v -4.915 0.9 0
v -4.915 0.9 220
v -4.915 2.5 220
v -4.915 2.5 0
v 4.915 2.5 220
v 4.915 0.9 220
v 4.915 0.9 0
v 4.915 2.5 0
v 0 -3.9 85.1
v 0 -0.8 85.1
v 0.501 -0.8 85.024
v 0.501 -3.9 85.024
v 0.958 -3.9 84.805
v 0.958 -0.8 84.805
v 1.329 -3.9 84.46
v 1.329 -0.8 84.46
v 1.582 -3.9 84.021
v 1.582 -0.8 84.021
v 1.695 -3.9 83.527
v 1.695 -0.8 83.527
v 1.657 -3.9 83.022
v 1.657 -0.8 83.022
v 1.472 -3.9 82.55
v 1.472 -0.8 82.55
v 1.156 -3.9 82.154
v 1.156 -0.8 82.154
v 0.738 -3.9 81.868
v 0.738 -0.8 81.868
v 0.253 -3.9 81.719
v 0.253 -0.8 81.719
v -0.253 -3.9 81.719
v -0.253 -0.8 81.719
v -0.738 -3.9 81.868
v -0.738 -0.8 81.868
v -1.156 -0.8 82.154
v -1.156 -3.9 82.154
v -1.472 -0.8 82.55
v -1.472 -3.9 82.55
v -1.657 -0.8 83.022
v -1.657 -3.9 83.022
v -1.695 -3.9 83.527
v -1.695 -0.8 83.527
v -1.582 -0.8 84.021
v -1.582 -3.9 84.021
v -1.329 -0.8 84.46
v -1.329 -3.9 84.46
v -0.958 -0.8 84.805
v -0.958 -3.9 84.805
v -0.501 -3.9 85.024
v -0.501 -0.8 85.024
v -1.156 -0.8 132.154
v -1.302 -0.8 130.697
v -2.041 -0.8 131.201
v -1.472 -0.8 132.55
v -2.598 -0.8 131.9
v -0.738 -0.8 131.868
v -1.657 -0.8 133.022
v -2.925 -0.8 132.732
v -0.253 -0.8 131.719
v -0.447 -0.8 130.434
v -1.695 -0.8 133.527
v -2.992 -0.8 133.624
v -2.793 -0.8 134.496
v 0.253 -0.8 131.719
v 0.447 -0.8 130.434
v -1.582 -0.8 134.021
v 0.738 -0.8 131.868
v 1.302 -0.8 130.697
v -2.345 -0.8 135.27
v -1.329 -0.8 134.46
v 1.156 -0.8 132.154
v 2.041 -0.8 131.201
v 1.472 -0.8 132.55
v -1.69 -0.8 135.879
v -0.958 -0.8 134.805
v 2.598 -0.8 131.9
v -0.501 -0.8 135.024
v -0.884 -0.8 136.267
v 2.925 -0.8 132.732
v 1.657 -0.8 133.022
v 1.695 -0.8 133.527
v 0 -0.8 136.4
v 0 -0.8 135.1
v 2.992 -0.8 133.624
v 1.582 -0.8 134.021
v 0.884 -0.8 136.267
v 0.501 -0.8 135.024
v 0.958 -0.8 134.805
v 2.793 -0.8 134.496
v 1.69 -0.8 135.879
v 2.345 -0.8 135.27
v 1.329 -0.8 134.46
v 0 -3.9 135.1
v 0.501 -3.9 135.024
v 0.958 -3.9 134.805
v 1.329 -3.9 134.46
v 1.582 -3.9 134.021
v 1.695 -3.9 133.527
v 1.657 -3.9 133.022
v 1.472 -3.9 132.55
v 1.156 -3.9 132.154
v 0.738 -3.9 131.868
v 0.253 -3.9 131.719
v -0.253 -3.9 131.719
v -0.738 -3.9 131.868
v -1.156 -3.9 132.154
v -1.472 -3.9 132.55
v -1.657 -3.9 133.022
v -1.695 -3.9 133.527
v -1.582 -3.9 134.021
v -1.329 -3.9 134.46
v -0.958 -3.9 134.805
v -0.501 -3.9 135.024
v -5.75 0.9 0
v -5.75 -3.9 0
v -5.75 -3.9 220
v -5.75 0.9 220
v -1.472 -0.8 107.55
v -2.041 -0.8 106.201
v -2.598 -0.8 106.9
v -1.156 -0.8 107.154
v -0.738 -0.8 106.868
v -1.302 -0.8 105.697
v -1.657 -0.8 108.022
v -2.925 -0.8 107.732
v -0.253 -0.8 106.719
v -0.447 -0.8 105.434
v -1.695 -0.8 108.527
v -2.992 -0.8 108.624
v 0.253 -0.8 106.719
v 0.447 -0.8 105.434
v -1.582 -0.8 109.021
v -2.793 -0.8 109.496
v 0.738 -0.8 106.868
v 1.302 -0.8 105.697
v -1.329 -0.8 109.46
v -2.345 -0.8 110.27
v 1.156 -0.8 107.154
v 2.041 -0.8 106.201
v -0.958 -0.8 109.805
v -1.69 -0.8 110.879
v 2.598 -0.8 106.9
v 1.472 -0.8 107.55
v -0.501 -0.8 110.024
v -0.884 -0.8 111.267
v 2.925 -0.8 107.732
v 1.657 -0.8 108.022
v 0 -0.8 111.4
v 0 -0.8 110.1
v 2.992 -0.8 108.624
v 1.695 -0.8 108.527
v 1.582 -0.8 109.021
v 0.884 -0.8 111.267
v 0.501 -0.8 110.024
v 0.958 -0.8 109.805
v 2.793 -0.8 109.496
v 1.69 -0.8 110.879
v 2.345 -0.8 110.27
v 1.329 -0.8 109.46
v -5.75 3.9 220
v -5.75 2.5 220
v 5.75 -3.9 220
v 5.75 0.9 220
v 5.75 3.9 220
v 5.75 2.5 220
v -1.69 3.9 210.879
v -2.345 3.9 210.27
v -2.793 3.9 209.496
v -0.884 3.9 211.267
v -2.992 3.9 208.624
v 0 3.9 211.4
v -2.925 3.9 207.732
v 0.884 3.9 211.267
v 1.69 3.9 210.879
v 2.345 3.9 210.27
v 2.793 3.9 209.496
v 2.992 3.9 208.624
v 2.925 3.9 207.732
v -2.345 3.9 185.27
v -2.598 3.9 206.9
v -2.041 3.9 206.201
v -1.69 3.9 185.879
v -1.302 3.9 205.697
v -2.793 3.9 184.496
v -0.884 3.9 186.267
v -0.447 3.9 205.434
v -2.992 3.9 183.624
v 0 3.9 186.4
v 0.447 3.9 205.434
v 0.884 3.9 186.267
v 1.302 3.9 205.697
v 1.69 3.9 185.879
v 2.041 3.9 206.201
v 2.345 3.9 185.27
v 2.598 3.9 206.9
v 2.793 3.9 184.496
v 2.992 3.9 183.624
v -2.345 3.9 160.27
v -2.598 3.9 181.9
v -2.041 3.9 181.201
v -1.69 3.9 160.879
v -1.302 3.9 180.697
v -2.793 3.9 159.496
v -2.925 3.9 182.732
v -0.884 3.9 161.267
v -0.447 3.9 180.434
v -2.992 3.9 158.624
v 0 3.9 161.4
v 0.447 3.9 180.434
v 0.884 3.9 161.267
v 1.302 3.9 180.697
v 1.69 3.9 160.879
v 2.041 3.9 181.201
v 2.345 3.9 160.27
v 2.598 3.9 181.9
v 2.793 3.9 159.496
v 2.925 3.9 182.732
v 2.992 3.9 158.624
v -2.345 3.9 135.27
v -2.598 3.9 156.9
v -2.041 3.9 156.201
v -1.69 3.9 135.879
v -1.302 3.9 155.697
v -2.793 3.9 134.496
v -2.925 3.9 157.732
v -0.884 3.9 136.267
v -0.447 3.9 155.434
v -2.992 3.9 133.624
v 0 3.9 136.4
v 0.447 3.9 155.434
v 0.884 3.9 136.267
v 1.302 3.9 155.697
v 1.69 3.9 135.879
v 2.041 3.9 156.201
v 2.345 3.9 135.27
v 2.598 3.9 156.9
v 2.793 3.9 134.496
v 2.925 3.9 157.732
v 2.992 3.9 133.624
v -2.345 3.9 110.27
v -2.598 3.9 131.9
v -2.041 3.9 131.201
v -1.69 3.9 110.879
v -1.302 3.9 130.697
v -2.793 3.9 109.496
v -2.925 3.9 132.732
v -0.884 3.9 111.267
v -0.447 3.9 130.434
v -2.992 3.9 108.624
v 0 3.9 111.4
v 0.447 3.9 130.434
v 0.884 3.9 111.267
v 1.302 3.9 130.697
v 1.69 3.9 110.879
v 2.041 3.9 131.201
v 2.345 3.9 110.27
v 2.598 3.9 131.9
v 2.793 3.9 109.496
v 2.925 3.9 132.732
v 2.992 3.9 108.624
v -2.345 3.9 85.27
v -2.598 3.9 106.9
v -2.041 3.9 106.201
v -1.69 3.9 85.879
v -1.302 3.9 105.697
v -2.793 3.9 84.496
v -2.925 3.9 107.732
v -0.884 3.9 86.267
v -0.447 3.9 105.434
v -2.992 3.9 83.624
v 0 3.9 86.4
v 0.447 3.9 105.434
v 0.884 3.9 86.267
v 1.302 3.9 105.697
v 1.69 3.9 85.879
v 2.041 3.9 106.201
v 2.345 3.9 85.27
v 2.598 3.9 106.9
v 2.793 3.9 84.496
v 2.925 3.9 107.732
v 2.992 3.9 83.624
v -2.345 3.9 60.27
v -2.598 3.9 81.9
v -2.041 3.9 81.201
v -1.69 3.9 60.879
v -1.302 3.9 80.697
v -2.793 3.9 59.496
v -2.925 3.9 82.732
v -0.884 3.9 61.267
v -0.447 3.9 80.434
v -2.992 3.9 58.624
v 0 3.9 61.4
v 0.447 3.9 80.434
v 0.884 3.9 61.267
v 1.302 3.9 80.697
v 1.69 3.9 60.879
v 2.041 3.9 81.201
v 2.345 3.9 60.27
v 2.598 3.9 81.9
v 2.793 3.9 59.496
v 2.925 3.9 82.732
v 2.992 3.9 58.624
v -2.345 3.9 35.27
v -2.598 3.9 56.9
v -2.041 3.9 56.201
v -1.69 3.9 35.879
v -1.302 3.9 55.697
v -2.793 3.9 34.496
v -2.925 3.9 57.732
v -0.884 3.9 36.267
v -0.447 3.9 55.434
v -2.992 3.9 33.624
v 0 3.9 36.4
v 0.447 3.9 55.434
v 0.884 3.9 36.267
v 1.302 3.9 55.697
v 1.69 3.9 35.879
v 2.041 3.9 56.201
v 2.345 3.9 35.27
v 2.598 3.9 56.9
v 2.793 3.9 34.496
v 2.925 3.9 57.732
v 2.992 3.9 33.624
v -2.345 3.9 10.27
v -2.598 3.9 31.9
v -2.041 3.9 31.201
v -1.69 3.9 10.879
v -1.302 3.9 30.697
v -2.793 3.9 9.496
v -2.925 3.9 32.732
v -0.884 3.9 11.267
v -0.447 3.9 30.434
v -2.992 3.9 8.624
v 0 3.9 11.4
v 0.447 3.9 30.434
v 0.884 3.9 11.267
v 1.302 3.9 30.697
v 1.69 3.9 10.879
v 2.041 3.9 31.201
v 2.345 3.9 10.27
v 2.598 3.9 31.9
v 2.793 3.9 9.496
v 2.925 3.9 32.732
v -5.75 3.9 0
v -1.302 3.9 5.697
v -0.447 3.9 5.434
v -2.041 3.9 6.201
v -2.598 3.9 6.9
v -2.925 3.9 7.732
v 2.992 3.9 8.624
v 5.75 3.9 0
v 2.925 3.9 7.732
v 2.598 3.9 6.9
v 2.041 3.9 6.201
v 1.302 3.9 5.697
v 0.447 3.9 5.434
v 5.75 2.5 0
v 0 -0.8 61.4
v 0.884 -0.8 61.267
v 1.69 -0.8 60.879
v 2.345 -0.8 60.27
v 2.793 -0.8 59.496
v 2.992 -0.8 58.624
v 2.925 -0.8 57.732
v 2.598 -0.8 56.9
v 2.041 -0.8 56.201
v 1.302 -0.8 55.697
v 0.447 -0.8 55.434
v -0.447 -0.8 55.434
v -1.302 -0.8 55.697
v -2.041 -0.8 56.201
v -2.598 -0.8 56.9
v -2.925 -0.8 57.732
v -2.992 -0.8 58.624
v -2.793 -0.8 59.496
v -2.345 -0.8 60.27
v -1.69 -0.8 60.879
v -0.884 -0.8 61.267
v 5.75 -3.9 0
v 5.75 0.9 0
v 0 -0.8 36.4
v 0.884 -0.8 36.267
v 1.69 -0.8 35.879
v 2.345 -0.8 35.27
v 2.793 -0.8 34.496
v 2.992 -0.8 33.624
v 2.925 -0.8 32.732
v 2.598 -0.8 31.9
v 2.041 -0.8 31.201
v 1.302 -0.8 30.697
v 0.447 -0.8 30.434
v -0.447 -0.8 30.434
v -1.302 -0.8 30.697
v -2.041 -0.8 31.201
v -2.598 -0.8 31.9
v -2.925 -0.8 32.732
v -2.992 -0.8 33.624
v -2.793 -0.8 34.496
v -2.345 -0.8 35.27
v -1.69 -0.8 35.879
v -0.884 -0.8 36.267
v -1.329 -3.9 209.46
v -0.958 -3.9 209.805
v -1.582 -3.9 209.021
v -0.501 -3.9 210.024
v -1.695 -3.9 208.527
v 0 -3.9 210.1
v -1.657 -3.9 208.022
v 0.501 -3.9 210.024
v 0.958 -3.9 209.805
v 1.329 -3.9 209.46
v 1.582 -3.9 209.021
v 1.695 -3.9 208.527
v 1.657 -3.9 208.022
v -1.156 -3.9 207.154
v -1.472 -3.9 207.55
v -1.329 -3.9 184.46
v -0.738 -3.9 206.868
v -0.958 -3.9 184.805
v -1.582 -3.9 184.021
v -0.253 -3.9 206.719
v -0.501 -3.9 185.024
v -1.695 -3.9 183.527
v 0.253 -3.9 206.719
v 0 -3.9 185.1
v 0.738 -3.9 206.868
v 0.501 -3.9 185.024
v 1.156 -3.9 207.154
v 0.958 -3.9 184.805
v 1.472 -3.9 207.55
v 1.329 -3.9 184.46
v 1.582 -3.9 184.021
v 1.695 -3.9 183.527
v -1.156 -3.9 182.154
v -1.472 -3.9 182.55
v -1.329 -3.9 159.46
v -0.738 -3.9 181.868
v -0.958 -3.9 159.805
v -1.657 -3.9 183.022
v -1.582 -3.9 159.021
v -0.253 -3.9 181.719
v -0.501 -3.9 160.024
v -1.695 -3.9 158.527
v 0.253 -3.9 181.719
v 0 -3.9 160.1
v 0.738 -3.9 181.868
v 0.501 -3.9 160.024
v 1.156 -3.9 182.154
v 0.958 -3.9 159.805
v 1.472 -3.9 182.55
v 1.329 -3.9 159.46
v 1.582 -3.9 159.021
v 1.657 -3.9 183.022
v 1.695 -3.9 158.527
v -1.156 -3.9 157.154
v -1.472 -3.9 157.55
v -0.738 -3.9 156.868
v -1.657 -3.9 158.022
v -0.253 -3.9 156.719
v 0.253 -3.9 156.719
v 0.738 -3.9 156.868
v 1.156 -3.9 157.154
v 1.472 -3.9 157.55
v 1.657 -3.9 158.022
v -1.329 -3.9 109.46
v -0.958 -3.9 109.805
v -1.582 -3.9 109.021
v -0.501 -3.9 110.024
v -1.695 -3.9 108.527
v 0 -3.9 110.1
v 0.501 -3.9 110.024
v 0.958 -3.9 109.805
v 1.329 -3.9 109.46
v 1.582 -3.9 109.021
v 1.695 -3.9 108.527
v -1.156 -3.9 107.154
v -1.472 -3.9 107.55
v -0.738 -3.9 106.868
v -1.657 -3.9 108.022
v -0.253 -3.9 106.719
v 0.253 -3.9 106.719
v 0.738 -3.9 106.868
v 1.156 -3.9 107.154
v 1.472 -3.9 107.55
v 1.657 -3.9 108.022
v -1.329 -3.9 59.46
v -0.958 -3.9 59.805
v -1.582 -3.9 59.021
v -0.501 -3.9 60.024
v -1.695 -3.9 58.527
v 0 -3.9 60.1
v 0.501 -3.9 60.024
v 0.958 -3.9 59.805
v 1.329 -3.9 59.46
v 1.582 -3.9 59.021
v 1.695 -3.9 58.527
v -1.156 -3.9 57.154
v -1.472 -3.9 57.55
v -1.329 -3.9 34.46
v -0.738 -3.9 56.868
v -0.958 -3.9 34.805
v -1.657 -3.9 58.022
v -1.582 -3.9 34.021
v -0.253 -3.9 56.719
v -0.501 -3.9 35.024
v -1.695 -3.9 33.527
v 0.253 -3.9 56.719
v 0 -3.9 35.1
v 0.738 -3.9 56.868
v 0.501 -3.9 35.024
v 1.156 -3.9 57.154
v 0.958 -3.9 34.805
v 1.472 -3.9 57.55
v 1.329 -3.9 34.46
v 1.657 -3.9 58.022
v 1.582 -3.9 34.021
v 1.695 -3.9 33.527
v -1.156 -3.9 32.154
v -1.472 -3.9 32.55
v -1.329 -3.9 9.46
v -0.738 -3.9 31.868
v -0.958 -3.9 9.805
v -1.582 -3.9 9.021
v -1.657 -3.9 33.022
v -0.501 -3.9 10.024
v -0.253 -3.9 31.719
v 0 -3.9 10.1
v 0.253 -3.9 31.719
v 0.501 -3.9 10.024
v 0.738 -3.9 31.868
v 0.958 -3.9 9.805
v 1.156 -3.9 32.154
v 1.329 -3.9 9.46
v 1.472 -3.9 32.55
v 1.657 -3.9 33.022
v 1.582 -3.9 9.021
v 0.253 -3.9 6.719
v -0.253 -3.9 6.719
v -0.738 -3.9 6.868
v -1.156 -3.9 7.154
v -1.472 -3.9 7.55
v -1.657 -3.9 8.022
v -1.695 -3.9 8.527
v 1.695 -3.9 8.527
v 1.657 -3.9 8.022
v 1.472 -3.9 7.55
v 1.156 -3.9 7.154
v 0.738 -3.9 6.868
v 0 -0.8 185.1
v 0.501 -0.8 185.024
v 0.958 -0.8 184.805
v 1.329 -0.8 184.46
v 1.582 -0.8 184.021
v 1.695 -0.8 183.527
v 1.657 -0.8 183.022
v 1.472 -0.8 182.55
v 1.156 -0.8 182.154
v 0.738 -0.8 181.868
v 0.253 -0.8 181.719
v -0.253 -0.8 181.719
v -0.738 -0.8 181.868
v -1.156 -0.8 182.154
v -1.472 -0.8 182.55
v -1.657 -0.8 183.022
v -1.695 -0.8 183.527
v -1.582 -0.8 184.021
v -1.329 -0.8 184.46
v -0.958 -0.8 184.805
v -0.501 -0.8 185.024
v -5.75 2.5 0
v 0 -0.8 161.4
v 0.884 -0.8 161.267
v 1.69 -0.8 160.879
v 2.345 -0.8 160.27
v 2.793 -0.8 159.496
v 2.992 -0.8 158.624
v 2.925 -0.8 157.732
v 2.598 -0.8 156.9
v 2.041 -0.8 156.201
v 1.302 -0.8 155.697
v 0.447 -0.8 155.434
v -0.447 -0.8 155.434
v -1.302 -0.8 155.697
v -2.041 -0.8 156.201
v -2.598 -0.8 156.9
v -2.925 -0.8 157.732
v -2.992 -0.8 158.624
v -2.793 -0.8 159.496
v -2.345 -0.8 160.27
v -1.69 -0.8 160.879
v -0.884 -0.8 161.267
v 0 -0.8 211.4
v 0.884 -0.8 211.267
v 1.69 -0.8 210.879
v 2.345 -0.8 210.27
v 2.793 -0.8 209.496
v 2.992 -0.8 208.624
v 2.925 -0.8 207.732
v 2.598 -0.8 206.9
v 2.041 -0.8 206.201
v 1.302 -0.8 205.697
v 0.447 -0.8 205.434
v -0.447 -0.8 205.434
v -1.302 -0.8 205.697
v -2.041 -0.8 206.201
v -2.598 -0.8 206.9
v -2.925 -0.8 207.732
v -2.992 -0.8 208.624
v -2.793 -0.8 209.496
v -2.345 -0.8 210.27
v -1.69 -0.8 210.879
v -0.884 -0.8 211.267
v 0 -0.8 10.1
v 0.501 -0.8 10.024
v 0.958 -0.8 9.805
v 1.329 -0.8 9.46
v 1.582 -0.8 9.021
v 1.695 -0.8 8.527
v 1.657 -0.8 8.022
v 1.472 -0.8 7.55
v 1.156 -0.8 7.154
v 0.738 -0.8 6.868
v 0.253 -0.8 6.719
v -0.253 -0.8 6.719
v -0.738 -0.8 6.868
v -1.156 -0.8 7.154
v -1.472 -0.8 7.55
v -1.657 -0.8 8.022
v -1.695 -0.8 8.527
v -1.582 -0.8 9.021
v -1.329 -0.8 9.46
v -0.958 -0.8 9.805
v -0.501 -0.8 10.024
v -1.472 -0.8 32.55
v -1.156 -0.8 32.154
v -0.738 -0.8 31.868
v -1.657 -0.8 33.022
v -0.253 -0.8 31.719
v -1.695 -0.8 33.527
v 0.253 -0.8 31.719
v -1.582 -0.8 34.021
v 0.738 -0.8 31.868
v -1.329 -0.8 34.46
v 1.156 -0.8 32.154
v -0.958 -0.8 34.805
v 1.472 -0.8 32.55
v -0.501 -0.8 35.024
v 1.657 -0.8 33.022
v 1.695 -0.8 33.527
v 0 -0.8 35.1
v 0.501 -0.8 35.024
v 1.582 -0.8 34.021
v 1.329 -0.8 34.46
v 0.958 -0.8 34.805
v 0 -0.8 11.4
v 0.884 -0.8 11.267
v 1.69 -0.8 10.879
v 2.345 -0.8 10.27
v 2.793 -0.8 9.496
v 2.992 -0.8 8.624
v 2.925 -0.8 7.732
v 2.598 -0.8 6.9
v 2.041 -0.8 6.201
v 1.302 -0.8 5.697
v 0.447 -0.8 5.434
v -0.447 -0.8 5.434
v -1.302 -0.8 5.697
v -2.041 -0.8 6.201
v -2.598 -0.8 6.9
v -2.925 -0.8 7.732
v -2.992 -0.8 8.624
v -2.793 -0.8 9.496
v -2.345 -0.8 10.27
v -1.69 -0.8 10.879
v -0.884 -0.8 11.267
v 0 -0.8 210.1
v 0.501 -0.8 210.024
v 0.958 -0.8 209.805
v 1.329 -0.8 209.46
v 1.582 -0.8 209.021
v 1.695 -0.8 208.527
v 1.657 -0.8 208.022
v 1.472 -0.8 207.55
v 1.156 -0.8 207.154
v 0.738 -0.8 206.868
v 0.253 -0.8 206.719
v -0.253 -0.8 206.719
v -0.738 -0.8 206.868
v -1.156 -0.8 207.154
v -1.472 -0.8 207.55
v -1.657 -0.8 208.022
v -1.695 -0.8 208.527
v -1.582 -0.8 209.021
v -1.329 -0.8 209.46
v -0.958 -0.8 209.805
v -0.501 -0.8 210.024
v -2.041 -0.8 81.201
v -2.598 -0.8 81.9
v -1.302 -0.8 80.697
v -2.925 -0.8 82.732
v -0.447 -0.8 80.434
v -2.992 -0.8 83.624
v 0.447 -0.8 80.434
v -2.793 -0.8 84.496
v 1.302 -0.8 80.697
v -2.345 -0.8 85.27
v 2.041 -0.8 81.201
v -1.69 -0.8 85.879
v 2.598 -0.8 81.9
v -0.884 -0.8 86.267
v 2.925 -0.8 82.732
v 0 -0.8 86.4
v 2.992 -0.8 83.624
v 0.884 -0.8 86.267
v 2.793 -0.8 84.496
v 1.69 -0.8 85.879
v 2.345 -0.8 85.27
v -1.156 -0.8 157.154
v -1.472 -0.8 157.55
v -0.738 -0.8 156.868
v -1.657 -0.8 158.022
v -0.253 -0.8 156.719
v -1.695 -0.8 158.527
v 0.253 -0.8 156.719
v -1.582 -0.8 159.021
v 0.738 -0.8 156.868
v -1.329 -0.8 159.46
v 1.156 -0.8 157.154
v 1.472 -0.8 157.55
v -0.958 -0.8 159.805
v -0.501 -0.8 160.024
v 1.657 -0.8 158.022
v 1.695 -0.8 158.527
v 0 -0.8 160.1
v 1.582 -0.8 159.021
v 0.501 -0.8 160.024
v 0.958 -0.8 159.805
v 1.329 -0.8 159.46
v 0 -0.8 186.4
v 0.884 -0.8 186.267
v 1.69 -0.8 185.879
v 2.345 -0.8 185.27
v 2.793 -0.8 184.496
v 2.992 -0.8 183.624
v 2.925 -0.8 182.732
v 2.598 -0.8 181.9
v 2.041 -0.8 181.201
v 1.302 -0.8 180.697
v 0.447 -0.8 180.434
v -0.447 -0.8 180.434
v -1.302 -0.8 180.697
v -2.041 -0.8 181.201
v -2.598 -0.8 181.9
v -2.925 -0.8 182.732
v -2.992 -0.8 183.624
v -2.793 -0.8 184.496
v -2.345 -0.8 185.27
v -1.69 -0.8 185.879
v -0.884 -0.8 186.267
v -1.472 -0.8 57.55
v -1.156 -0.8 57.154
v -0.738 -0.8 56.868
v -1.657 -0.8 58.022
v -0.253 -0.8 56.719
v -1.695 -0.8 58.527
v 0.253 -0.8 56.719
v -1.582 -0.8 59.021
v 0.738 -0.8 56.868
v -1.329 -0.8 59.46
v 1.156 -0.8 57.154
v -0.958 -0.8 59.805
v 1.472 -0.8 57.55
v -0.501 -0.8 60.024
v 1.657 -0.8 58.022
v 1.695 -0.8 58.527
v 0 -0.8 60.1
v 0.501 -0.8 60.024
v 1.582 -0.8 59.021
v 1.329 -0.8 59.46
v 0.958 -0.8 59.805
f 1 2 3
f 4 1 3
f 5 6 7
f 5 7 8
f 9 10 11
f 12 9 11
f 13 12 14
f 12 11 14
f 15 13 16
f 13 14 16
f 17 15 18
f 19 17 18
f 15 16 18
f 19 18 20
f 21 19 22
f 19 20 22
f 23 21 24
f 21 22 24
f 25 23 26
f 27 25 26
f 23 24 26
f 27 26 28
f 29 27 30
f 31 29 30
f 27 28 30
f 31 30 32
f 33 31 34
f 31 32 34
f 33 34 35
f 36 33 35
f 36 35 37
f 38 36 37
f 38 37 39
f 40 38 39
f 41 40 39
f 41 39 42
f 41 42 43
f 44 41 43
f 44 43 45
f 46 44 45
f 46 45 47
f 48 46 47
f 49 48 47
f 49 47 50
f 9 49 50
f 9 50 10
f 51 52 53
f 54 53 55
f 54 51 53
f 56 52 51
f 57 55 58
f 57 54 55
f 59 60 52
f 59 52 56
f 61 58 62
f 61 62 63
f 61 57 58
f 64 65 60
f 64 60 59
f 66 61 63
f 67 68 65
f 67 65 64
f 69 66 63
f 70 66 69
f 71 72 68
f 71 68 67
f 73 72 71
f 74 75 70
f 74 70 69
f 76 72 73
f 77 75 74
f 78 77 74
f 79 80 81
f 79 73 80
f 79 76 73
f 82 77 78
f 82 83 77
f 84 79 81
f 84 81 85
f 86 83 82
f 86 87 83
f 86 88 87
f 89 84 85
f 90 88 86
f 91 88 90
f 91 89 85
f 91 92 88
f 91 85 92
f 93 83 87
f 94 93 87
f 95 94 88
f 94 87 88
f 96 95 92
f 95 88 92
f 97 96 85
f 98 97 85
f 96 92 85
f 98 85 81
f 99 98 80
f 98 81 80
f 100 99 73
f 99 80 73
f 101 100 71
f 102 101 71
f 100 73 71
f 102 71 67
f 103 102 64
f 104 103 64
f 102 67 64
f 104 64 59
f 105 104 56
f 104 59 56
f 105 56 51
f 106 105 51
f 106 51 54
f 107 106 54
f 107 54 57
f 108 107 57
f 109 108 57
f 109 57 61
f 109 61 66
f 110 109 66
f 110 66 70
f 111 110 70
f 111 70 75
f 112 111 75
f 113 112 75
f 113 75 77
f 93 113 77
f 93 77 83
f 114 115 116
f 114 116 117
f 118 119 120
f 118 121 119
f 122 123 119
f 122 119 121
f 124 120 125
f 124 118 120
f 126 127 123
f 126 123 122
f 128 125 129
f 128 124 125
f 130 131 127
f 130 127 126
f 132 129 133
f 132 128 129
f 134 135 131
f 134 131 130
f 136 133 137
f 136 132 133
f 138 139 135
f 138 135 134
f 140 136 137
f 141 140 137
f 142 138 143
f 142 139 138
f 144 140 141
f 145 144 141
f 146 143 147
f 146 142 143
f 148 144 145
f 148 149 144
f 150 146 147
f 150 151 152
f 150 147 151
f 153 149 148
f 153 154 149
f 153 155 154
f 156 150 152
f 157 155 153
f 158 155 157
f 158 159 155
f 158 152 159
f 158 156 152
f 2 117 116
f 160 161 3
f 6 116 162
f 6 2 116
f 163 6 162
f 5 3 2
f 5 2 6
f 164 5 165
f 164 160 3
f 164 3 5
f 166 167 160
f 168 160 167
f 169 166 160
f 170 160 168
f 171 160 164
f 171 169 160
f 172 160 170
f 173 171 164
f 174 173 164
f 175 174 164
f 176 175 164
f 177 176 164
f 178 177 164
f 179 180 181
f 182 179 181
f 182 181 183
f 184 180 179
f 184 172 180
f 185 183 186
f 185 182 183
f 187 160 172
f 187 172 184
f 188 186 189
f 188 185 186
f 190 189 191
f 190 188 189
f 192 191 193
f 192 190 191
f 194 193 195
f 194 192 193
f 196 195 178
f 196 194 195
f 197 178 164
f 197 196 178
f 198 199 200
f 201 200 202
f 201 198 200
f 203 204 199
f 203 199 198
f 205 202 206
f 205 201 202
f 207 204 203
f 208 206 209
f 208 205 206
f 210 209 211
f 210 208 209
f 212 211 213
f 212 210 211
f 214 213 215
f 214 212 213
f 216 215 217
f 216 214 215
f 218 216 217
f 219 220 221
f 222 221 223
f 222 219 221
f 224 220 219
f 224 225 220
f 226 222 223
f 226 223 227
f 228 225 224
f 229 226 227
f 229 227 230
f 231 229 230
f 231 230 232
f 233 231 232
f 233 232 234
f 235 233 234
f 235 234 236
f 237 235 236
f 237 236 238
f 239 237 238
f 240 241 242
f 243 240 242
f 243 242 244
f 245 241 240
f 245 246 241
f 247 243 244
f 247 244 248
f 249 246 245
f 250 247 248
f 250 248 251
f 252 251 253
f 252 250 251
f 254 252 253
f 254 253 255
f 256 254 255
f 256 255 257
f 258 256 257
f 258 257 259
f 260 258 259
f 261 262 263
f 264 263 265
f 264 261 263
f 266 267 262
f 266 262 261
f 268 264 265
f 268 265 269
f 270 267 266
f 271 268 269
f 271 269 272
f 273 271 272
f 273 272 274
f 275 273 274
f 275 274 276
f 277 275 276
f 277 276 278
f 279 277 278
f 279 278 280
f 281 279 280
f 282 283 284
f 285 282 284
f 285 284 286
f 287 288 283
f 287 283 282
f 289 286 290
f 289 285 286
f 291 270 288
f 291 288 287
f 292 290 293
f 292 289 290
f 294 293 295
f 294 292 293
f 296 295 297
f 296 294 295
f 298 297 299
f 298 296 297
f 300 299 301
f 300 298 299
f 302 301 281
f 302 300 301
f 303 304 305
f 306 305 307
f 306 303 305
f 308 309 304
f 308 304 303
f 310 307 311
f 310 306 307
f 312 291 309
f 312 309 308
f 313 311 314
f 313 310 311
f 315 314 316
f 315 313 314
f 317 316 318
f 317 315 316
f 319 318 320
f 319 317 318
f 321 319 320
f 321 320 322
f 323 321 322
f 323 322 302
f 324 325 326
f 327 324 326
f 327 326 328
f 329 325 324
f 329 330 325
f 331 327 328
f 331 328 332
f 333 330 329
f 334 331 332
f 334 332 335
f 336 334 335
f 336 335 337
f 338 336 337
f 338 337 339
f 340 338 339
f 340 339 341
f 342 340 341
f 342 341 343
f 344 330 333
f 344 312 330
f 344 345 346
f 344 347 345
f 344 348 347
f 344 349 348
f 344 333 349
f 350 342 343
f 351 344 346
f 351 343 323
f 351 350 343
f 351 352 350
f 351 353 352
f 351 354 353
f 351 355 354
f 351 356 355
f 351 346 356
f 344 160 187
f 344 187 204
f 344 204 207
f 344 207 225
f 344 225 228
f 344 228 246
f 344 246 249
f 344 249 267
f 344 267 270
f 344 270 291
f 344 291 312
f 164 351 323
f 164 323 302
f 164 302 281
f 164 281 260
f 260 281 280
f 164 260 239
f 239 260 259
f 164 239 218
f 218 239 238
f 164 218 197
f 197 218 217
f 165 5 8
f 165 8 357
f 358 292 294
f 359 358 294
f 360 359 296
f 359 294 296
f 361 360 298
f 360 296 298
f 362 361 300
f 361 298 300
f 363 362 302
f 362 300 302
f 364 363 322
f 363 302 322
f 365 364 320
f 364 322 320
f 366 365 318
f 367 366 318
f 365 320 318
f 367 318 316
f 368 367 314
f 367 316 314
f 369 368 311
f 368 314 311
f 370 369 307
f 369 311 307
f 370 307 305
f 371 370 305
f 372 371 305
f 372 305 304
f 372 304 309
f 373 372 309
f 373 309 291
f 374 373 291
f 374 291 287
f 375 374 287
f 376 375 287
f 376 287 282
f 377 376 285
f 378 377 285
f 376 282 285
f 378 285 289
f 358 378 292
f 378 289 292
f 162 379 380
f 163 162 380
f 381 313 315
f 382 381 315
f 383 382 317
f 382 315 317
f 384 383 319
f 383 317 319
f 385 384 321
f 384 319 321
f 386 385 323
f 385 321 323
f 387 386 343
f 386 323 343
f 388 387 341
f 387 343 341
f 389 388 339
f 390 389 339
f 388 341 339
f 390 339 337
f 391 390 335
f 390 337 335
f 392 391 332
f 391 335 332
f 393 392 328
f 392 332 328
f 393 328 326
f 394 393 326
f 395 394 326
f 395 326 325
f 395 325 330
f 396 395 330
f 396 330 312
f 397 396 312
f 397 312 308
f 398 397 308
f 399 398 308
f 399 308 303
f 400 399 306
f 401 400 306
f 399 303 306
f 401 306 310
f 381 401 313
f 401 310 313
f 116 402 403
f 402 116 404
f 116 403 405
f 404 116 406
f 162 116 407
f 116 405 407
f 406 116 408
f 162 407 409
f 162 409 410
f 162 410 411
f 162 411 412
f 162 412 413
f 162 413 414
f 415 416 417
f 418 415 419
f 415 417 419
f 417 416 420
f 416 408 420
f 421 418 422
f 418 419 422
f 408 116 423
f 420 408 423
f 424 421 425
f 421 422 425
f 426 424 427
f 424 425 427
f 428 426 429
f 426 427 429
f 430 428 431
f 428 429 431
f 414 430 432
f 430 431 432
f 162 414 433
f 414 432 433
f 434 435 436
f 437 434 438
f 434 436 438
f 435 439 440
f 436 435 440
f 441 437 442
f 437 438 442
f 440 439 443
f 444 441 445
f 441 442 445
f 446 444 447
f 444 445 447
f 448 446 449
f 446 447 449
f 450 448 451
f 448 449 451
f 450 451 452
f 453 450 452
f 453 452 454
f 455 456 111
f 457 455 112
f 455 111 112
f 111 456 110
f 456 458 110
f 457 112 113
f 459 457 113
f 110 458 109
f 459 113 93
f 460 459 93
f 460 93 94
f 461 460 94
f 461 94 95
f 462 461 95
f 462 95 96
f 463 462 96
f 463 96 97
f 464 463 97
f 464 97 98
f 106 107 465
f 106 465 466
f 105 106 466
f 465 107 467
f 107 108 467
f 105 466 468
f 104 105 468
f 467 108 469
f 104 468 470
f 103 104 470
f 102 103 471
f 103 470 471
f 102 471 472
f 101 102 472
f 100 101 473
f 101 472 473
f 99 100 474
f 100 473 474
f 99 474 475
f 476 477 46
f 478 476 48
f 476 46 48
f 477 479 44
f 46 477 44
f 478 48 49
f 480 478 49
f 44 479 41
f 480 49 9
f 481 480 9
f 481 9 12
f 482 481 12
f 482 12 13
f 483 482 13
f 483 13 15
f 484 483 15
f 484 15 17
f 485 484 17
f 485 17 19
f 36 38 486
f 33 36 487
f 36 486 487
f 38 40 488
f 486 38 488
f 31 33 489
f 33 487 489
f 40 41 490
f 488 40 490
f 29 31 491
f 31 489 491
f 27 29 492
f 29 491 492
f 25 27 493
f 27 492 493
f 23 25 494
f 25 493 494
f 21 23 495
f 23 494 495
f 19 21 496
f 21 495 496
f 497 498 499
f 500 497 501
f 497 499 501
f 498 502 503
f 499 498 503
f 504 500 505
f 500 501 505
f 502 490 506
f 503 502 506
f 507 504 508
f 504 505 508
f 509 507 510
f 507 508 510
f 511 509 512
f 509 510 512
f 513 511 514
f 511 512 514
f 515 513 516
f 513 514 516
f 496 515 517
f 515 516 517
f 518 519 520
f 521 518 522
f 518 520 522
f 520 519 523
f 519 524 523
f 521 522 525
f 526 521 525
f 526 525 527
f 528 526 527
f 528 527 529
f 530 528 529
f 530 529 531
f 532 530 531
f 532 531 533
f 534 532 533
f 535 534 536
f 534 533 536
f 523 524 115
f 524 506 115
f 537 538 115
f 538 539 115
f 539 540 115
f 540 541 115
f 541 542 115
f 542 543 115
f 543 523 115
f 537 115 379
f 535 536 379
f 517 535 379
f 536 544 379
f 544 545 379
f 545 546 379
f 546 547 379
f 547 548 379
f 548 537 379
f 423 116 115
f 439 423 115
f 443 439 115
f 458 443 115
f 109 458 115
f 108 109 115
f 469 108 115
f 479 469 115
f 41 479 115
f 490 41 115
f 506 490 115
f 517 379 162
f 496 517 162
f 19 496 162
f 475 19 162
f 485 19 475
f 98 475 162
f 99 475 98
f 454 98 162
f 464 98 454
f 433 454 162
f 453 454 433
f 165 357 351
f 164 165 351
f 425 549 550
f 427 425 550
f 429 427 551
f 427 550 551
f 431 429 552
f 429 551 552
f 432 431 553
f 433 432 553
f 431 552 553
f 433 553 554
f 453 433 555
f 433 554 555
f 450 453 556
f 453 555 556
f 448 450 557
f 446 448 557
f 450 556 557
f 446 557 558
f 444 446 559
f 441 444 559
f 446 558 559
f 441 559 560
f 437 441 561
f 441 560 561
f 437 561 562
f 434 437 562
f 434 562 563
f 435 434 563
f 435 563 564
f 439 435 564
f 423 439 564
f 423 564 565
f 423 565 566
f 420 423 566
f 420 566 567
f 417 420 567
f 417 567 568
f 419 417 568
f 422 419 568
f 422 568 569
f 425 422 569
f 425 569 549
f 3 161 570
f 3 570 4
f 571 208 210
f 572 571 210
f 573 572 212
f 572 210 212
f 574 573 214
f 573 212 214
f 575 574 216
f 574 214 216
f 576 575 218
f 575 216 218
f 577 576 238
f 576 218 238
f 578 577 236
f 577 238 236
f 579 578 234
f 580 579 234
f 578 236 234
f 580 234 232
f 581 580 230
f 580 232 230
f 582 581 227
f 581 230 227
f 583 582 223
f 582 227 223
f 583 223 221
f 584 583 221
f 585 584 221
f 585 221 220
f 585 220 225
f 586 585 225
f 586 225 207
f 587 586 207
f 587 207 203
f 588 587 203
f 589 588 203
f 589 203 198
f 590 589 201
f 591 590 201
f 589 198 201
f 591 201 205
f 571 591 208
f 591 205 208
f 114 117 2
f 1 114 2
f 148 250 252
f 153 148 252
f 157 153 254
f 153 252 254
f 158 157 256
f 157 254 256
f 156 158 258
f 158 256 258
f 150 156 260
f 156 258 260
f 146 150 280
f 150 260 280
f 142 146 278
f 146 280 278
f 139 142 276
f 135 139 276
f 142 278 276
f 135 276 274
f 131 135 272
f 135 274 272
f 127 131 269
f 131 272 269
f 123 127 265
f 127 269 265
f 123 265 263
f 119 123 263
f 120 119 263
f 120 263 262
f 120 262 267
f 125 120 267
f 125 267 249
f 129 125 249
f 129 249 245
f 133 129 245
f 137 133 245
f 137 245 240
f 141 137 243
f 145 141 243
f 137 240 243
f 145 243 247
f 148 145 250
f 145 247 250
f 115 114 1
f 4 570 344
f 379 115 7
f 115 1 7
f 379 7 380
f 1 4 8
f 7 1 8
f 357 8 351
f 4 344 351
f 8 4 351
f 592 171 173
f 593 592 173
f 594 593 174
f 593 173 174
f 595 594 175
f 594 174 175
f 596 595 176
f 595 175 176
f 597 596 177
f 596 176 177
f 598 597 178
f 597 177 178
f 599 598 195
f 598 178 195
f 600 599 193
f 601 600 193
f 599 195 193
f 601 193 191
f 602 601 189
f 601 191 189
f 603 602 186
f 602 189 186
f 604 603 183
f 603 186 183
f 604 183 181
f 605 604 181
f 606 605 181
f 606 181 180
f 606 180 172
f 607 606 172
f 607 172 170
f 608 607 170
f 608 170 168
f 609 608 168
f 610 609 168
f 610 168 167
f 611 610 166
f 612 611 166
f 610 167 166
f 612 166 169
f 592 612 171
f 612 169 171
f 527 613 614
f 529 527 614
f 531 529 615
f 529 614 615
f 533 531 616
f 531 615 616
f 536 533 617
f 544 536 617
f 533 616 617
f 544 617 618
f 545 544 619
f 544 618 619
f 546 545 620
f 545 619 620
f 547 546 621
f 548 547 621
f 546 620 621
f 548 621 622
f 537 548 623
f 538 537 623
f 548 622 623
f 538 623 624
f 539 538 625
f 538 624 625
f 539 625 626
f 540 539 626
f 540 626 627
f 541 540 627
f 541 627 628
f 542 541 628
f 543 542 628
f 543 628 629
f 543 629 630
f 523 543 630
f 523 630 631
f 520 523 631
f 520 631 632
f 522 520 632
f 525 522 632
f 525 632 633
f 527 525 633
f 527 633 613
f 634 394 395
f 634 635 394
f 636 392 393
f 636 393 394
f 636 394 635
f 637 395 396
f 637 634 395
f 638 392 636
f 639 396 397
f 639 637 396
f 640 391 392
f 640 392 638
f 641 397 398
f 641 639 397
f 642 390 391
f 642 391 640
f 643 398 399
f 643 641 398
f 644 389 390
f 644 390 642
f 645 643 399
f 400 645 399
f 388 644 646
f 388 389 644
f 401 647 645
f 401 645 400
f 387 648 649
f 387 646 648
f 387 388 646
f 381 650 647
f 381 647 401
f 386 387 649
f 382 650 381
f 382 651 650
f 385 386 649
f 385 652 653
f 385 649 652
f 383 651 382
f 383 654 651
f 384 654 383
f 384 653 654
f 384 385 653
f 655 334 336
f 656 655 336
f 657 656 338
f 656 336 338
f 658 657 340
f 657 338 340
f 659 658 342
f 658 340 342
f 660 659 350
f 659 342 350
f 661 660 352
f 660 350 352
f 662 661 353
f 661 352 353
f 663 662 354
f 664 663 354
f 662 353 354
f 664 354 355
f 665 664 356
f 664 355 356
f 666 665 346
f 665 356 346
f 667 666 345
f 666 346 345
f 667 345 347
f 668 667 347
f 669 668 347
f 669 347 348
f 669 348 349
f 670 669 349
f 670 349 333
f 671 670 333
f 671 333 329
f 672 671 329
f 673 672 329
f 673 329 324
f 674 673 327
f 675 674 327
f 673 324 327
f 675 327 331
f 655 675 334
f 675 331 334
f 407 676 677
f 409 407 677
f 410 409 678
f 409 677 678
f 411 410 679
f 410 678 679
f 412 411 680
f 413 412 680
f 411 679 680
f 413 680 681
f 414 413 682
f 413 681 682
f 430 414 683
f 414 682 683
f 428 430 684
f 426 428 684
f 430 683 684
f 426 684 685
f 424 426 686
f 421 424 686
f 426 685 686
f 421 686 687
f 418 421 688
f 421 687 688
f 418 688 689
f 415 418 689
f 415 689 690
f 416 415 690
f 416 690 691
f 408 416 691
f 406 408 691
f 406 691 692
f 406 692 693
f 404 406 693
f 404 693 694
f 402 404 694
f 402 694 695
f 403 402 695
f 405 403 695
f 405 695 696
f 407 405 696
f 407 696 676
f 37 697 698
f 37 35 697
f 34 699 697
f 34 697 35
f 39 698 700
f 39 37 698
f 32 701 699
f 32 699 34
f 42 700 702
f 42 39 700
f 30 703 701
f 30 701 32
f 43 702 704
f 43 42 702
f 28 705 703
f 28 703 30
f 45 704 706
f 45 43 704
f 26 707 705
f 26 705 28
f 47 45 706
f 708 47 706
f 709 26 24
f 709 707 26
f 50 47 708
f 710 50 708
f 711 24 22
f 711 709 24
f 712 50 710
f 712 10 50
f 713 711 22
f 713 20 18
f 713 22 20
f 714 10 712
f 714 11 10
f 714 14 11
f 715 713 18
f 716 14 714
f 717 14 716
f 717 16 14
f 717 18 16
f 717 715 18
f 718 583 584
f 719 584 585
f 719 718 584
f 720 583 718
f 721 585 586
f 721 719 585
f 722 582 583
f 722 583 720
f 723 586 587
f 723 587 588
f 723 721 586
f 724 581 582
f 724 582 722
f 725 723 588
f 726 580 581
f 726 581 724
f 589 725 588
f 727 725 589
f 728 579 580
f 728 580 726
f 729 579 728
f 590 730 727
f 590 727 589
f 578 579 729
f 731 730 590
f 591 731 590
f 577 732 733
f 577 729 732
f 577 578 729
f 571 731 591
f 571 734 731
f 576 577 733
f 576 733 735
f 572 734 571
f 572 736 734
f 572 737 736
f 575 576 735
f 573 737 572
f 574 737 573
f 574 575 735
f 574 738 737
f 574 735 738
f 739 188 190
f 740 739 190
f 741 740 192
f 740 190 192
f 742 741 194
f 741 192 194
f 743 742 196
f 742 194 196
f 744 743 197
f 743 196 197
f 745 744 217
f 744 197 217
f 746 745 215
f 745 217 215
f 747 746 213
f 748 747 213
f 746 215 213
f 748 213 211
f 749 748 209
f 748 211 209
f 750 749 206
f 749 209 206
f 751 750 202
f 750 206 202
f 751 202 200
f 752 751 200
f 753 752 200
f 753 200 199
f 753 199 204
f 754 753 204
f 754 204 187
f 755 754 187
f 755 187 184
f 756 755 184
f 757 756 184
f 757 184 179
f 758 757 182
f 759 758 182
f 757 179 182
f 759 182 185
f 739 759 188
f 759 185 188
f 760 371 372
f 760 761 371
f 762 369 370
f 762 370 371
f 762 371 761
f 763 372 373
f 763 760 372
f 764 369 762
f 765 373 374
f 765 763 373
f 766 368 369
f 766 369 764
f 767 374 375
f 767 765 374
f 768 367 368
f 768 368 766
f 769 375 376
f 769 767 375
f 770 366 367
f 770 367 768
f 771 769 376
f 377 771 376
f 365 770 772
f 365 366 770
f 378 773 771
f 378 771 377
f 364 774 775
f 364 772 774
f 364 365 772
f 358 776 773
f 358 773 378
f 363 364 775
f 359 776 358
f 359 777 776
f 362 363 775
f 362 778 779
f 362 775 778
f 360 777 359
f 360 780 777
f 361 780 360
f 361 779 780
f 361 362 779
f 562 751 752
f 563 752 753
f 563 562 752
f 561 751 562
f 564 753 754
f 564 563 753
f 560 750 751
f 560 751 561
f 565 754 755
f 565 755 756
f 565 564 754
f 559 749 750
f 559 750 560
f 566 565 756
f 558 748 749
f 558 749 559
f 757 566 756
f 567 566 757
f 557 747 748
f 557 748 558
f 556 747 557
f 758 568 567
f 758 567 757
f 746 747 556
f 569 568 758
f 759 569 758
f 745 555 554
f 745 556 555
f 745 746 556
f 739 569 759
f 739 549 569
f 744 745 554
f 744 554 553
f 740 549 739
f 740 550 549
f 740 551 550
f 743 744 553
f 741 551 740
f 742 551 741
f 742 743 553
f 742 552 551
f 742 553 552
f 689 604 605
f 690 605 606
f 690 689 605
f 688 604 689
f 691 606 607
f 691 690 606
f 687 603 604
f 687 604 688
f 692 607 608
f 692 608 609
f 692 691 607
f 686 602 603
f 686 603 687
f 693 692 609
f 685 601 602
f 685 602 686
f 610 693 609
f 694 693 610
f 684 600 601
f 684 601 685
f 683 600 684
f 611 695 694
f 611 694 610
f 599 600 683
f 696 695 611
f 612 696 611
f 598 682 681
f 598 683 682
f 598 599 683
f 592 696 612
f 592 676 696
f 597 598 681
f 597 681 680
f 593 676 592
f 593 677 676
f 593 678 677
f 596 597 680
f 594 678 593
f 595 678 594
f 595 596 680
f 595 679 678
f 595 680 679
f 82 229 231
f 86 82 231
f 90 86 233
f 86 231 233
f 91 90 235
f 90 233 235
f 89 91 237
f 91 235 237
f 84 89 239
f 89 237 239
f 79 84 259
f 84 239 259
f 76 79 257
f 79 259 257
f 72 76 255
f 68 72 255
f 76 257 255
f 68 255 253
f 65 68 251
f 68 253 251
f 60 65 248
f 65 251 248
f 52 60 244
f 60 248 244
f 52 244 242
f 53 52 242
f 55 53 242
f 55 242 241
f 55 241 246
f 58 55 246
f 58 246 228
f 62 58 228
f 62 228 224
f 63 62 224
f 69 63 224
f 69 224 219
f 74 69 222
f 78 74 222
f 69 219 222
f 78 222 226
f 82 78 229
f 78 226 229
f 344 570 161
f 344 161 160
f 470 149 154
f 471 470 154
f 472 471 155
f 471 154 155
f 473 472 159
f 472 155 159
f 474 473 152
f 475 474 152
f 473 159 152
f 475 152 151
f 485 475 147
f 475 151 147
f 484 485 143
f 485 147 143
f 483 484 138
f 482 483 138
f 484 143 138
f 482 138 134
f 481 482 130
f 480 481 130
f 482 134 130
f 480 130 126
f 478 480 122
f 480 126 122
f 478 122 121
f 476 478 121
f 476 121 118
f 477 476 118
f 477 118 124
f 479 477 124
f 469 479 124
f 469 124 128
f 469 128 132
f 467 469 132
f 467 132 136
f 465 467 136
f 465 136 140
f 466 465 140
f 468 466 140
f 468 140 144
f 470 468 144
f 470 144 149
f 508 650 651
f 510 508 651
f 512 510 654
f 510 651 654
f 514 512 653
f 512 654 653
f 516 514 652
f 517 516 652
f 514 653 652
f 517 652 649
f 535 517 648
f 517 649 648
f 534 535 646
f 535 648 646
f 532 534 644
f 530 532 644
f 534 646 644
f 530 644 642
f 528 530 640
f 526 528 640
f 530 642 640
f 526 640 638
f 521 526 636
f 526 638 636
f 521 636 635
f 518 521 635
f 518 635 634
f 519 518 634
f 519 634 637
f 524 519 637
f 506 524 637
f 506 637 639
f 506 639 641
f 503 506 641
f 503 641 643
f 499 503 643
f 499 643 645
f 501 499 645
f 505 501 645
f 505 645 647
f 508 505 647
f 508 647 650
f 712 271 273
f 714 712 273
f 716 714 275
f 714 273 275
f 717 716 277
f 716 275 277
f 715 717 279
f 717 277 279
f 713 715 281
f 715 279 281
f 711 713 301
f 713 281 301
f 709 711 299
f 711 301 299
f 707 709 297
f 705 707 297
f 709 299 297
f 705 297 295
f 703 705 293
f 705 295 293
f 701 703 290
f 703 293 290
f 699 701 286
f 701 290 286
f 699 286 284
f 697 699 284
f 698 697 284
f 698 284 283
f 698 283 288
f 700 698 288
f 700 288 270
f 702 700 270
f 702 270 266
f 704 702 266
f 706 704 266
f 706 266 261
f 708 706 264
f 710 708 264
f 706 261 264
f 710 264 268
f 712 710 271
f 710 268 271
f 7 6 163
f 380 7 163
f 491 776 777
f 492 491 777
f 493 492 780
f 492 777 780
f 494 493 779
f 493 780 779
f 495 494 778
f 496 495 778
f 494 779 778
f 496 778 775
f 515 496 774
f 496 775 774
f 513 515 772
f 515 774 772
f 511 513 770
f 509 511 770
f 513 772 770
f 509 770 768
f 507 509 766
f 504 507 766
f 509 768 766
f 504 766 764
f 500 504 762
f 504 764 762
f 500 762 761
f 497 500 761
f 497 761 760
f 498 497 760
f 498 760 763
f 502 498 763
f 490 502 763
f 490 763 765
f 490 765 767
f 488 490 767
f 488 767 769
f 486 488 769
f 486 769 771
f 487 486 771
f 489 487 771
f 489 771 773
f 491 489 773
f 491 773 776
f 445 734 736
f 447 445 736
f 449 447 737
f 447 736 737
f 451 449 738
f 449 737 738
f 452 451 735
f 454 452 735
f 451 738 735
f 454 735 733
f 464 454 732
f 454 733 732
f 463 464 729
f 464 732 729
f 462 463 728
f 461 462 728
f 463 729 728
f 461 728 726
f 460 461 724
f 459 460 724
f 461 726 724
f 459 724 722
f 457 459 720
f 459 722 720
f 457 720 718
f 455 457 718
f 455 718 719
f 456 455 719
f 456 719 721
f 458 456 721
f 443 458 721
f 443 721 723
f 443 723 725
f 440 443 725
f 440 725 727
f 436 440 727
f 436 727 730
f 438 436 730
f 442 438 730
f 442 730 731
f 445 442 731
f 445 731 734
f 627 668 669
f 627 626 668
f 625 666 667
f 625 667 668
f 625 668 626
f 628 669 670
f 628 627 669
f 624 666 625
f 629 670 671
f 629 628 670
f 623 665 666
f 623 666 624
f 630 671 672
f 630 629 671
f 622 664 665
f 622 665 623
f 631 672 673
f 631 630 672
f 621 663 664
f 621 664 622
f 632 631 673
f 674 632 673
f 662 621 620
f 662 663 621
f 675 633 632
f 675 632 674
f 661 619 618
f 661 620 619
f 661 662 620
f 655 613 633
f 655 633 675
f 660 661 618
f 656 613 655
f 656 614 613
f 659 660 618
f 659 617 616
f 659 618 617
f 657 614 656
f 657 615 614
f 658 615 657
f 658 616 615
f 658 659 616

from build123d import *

# Parameters (mm, degrees)
SKETCH1_W           = 11.5
SKETCH1_H           = 7.8
BOSS_EXTRUDE1_DEPTH = 220
SKETCH2_W           = 0.835250229
SKETCH2_H           = 1.6
CUT_EXTRUDE1_DEPTH  = 221.109682886
SKETCH3_R           = 3
CUT_EXTRUDE2_DEPTH  = 4.7
SKETCH4_R           = 1.7
CUT_EXTRUDE3_DEPTH  = 221.125310903


with BuildPart() as part:
    # Sketch1 → Boss-Extrude1 (new body)
    with BuildSketch(Plane.XY):
        Rectangle(SKETCH1_W, SKETCH1_H)
    extrude(amount=BOSS_EXTRUDE1_DEPTH)

    # Sketch2 → Cut-Extrude1 (cut, through all)
    with BuildSketch(Plane.XY.offset(220)):
        with Locations((5.332374886, 1.7)):
            Rectangle(SKETCH2_W, SKETCH2_H)
        with Locations((-5.332374886, 1.7)):
            Rectangle(SKETCH2_W, SKETCH2_H)
    extrude(amount=-CUT_EXTRUDE1_DEPTH, mode=Mode.SUBTRACT)

    # Sketch3 → Cut-Extrude2 (cut)
    with BuildSketch(Plane(origin=(0, 3.9, 0), x_dir=(1, 0, 0), z_dir=(0, 1, 0))):
        with Locations(Location((0, -208.4, 0), (0, 0, 270))):
            Circle(SKETCH3_R)
        with Locations(Location((0, -183.4, 0), (0, 0, 270))):
            Circle(SKETCH3_R)
        with Locations(Location((0, -158.4, 0), (0, 0, 270))):
            Circle(SKETCH3_R)
        with Locations(Location((0, -133.4, 0), (0, 0, 270))):
            Circle(SKETCH3_R)
        with Locations(Location((0, -108.4, 0), (0, 0, 270))):
            Circle(SKETCH3_R)
        with Locations(Location((0, -83.4, 0), (0, 0, 270))):
            Circle(SKETCH3_R)
        with Locations(Location((0, -58.4, 0), (0, 0, 270))):
            Circle(SKETCH3_R)
        with Locations(Location((0, -33.4, 0), (0, 0, 270))):
            Circle(SKETCH3_R)
        with Locations(Location((0, -8.4, 0), (0, 0, 270))):
            Circle(SKETCH3_R)
        with Locations((0, 16.6)):
            Circle(SKETCH3_R)
        with Locations((0, 41.6)):
            Circle(SKETCH3_R)
        with Locations((0, 66.6)):
            Circle(SKETCH3_R)
        with Locations((0, 91.6)):
            Circle(SKETCH3_R)
        with Locations((0, 116.6)):
            Circle(SKETCH3_R)
        with Locations((0, 141.6)):
            Circle(SKETCH3_R)
        with Locations((0, 166.6)):
            Circle(SKETCH3_R)
        with Locations((0, 191.6)):
            Circle(SKETCH3_R)
        with Locations((0, 216.6)):
            Circle(SKETCH3_R)
        with Locations((0, 241.6)):
            Circle(SKETCH3_R)
        with Locations((0, 266.6)):
            Circle(SKETCH3_R)
        with Locations((0, 291.6)):
            Circle(SKETCH3_R)
        with Locations((0, 316.6)):
            Circle(SKETCH3_R)
        with Locations((0, 341.6)):
            Circle(SKETCH3_R)
        with Locations((0, 366.6)):
            Circle(SKETCH3_R)
        with Locations((0, 391.6)):
            Circle(SKETCH3_R)
        with Locations((0, 416.6)):
            Circle(SKETCH3_R)
        with Locations((0, 441.6)):
            Circle(SKETCH3_R)
        with Locations((0, 466.6)):
            Circle(SKETCH3_R)
        with Locations((0, 491.6)):
            Circle(SKETCH3_R)
        with Locations((0, 516.6)):
            Circle(SKETCH3_R)
    extrude(amount=-CUT_EXTRUDE2_DEPTH, mode=Mode.SUBTRACT)

    # Sketch4 → Cut-Extrude3 (cut, through all)
    with BuildSketch(Plane(origin=(0, -0.8, 0), x_dir=(1, 0, 0), z_dir=(0, 1, 0))):
        with Locations(Location((0, -208.4, 0), (0, 0, 270))):
            Circle(SKETCH4_R)
        with Locations(Location((0, -183.4, 0), (0, 0, 270))):
            Circle(SKETCH4_R)
        with Locations(Location((0, -158.4, 0), (0, 0, 270))):
            Circle(SKETCH4_R)
        with Locations(Location((0, -133.4, 0), (0, 0, 270))):
            Circle(SKETCH4_R)
        with Locations(Location((0, -108.4, 0), (0, 0, 270))):
            Circle(SKETCH4_R)
        with Locations(Location((0, -83.4, 0), (0, 0, 270))):
            Circle(SKETCH4_R)
        with Locations(Location((0, -58.4, 0), (0, 0, 270))):
            Circle(SKETCH4_R)
        with Locations(Location((0, -33.4, 0), (0, 0, 270))):
            Circle(SKETCH4_R)
        with Locations(Location((0, -8.4, 0), (0, 0, 270))):
            Circle(SKETCH4_R)
        with Locations((0, 16.6)):
            Circle(SKETCH4_R)
        with Locations((0, 41.6)):
            Circle(SKETCH4_R)
        with Locations((0, 66.6)):
            Circle(SKETCH4_R)
        with Locations((0, 91.6)):
            Circle(SKETCH4_R)
        with Locations((0, 116.6)):
            Circle(SKETCH4_R)
        with Locations((0, 141.6)):
            Circle(SKETCH4_R)
        with Locations((0, 166.6)):
            Circle(SKETCH4_R)
        with Locations((0, 191.6)):
            Circle(SKETCH4_R)
        with Locations((0, 216.6)):
            Circle(SKETCH4_R)
        with Locations((0, 241.6)):
            Circle(SKETCH4_R)
        with Locations((0, 266.6)):
            Circle(SKETCH4_R)
        with Locations((0, 291.6)):
            Circle(SKETCH4_R)
        with Locations((0, 316.6)):
            Circle(SKETCH4_R)
        with Locations((0, 341.6)):
            Circle(SKETCH4_R)
        with Locations((0, 366.6)):
            Circle(SKETCH4_R)
        with Locations((0, 391.6)):
            Circle(SKETCH4_R)
        with Locations((0, 416.6)):
            Circle(SKETCH4_R)
        with Locations((0, 441.6)):
            Circle(SKETCH4_R)
        with Locations((0, 466.6)):
            Circle(SKETCH4_R)
        with Locations((0, 491.6)):
            Circle(SKETCH4_R)
        with Locations((0, 516.6)):
            Circle(SKETCH4_R)
    extrude(amount=-CUT_EXTRUDE3_DEPTH, mode=Mode.SUBTRACT)


solid = part.part
